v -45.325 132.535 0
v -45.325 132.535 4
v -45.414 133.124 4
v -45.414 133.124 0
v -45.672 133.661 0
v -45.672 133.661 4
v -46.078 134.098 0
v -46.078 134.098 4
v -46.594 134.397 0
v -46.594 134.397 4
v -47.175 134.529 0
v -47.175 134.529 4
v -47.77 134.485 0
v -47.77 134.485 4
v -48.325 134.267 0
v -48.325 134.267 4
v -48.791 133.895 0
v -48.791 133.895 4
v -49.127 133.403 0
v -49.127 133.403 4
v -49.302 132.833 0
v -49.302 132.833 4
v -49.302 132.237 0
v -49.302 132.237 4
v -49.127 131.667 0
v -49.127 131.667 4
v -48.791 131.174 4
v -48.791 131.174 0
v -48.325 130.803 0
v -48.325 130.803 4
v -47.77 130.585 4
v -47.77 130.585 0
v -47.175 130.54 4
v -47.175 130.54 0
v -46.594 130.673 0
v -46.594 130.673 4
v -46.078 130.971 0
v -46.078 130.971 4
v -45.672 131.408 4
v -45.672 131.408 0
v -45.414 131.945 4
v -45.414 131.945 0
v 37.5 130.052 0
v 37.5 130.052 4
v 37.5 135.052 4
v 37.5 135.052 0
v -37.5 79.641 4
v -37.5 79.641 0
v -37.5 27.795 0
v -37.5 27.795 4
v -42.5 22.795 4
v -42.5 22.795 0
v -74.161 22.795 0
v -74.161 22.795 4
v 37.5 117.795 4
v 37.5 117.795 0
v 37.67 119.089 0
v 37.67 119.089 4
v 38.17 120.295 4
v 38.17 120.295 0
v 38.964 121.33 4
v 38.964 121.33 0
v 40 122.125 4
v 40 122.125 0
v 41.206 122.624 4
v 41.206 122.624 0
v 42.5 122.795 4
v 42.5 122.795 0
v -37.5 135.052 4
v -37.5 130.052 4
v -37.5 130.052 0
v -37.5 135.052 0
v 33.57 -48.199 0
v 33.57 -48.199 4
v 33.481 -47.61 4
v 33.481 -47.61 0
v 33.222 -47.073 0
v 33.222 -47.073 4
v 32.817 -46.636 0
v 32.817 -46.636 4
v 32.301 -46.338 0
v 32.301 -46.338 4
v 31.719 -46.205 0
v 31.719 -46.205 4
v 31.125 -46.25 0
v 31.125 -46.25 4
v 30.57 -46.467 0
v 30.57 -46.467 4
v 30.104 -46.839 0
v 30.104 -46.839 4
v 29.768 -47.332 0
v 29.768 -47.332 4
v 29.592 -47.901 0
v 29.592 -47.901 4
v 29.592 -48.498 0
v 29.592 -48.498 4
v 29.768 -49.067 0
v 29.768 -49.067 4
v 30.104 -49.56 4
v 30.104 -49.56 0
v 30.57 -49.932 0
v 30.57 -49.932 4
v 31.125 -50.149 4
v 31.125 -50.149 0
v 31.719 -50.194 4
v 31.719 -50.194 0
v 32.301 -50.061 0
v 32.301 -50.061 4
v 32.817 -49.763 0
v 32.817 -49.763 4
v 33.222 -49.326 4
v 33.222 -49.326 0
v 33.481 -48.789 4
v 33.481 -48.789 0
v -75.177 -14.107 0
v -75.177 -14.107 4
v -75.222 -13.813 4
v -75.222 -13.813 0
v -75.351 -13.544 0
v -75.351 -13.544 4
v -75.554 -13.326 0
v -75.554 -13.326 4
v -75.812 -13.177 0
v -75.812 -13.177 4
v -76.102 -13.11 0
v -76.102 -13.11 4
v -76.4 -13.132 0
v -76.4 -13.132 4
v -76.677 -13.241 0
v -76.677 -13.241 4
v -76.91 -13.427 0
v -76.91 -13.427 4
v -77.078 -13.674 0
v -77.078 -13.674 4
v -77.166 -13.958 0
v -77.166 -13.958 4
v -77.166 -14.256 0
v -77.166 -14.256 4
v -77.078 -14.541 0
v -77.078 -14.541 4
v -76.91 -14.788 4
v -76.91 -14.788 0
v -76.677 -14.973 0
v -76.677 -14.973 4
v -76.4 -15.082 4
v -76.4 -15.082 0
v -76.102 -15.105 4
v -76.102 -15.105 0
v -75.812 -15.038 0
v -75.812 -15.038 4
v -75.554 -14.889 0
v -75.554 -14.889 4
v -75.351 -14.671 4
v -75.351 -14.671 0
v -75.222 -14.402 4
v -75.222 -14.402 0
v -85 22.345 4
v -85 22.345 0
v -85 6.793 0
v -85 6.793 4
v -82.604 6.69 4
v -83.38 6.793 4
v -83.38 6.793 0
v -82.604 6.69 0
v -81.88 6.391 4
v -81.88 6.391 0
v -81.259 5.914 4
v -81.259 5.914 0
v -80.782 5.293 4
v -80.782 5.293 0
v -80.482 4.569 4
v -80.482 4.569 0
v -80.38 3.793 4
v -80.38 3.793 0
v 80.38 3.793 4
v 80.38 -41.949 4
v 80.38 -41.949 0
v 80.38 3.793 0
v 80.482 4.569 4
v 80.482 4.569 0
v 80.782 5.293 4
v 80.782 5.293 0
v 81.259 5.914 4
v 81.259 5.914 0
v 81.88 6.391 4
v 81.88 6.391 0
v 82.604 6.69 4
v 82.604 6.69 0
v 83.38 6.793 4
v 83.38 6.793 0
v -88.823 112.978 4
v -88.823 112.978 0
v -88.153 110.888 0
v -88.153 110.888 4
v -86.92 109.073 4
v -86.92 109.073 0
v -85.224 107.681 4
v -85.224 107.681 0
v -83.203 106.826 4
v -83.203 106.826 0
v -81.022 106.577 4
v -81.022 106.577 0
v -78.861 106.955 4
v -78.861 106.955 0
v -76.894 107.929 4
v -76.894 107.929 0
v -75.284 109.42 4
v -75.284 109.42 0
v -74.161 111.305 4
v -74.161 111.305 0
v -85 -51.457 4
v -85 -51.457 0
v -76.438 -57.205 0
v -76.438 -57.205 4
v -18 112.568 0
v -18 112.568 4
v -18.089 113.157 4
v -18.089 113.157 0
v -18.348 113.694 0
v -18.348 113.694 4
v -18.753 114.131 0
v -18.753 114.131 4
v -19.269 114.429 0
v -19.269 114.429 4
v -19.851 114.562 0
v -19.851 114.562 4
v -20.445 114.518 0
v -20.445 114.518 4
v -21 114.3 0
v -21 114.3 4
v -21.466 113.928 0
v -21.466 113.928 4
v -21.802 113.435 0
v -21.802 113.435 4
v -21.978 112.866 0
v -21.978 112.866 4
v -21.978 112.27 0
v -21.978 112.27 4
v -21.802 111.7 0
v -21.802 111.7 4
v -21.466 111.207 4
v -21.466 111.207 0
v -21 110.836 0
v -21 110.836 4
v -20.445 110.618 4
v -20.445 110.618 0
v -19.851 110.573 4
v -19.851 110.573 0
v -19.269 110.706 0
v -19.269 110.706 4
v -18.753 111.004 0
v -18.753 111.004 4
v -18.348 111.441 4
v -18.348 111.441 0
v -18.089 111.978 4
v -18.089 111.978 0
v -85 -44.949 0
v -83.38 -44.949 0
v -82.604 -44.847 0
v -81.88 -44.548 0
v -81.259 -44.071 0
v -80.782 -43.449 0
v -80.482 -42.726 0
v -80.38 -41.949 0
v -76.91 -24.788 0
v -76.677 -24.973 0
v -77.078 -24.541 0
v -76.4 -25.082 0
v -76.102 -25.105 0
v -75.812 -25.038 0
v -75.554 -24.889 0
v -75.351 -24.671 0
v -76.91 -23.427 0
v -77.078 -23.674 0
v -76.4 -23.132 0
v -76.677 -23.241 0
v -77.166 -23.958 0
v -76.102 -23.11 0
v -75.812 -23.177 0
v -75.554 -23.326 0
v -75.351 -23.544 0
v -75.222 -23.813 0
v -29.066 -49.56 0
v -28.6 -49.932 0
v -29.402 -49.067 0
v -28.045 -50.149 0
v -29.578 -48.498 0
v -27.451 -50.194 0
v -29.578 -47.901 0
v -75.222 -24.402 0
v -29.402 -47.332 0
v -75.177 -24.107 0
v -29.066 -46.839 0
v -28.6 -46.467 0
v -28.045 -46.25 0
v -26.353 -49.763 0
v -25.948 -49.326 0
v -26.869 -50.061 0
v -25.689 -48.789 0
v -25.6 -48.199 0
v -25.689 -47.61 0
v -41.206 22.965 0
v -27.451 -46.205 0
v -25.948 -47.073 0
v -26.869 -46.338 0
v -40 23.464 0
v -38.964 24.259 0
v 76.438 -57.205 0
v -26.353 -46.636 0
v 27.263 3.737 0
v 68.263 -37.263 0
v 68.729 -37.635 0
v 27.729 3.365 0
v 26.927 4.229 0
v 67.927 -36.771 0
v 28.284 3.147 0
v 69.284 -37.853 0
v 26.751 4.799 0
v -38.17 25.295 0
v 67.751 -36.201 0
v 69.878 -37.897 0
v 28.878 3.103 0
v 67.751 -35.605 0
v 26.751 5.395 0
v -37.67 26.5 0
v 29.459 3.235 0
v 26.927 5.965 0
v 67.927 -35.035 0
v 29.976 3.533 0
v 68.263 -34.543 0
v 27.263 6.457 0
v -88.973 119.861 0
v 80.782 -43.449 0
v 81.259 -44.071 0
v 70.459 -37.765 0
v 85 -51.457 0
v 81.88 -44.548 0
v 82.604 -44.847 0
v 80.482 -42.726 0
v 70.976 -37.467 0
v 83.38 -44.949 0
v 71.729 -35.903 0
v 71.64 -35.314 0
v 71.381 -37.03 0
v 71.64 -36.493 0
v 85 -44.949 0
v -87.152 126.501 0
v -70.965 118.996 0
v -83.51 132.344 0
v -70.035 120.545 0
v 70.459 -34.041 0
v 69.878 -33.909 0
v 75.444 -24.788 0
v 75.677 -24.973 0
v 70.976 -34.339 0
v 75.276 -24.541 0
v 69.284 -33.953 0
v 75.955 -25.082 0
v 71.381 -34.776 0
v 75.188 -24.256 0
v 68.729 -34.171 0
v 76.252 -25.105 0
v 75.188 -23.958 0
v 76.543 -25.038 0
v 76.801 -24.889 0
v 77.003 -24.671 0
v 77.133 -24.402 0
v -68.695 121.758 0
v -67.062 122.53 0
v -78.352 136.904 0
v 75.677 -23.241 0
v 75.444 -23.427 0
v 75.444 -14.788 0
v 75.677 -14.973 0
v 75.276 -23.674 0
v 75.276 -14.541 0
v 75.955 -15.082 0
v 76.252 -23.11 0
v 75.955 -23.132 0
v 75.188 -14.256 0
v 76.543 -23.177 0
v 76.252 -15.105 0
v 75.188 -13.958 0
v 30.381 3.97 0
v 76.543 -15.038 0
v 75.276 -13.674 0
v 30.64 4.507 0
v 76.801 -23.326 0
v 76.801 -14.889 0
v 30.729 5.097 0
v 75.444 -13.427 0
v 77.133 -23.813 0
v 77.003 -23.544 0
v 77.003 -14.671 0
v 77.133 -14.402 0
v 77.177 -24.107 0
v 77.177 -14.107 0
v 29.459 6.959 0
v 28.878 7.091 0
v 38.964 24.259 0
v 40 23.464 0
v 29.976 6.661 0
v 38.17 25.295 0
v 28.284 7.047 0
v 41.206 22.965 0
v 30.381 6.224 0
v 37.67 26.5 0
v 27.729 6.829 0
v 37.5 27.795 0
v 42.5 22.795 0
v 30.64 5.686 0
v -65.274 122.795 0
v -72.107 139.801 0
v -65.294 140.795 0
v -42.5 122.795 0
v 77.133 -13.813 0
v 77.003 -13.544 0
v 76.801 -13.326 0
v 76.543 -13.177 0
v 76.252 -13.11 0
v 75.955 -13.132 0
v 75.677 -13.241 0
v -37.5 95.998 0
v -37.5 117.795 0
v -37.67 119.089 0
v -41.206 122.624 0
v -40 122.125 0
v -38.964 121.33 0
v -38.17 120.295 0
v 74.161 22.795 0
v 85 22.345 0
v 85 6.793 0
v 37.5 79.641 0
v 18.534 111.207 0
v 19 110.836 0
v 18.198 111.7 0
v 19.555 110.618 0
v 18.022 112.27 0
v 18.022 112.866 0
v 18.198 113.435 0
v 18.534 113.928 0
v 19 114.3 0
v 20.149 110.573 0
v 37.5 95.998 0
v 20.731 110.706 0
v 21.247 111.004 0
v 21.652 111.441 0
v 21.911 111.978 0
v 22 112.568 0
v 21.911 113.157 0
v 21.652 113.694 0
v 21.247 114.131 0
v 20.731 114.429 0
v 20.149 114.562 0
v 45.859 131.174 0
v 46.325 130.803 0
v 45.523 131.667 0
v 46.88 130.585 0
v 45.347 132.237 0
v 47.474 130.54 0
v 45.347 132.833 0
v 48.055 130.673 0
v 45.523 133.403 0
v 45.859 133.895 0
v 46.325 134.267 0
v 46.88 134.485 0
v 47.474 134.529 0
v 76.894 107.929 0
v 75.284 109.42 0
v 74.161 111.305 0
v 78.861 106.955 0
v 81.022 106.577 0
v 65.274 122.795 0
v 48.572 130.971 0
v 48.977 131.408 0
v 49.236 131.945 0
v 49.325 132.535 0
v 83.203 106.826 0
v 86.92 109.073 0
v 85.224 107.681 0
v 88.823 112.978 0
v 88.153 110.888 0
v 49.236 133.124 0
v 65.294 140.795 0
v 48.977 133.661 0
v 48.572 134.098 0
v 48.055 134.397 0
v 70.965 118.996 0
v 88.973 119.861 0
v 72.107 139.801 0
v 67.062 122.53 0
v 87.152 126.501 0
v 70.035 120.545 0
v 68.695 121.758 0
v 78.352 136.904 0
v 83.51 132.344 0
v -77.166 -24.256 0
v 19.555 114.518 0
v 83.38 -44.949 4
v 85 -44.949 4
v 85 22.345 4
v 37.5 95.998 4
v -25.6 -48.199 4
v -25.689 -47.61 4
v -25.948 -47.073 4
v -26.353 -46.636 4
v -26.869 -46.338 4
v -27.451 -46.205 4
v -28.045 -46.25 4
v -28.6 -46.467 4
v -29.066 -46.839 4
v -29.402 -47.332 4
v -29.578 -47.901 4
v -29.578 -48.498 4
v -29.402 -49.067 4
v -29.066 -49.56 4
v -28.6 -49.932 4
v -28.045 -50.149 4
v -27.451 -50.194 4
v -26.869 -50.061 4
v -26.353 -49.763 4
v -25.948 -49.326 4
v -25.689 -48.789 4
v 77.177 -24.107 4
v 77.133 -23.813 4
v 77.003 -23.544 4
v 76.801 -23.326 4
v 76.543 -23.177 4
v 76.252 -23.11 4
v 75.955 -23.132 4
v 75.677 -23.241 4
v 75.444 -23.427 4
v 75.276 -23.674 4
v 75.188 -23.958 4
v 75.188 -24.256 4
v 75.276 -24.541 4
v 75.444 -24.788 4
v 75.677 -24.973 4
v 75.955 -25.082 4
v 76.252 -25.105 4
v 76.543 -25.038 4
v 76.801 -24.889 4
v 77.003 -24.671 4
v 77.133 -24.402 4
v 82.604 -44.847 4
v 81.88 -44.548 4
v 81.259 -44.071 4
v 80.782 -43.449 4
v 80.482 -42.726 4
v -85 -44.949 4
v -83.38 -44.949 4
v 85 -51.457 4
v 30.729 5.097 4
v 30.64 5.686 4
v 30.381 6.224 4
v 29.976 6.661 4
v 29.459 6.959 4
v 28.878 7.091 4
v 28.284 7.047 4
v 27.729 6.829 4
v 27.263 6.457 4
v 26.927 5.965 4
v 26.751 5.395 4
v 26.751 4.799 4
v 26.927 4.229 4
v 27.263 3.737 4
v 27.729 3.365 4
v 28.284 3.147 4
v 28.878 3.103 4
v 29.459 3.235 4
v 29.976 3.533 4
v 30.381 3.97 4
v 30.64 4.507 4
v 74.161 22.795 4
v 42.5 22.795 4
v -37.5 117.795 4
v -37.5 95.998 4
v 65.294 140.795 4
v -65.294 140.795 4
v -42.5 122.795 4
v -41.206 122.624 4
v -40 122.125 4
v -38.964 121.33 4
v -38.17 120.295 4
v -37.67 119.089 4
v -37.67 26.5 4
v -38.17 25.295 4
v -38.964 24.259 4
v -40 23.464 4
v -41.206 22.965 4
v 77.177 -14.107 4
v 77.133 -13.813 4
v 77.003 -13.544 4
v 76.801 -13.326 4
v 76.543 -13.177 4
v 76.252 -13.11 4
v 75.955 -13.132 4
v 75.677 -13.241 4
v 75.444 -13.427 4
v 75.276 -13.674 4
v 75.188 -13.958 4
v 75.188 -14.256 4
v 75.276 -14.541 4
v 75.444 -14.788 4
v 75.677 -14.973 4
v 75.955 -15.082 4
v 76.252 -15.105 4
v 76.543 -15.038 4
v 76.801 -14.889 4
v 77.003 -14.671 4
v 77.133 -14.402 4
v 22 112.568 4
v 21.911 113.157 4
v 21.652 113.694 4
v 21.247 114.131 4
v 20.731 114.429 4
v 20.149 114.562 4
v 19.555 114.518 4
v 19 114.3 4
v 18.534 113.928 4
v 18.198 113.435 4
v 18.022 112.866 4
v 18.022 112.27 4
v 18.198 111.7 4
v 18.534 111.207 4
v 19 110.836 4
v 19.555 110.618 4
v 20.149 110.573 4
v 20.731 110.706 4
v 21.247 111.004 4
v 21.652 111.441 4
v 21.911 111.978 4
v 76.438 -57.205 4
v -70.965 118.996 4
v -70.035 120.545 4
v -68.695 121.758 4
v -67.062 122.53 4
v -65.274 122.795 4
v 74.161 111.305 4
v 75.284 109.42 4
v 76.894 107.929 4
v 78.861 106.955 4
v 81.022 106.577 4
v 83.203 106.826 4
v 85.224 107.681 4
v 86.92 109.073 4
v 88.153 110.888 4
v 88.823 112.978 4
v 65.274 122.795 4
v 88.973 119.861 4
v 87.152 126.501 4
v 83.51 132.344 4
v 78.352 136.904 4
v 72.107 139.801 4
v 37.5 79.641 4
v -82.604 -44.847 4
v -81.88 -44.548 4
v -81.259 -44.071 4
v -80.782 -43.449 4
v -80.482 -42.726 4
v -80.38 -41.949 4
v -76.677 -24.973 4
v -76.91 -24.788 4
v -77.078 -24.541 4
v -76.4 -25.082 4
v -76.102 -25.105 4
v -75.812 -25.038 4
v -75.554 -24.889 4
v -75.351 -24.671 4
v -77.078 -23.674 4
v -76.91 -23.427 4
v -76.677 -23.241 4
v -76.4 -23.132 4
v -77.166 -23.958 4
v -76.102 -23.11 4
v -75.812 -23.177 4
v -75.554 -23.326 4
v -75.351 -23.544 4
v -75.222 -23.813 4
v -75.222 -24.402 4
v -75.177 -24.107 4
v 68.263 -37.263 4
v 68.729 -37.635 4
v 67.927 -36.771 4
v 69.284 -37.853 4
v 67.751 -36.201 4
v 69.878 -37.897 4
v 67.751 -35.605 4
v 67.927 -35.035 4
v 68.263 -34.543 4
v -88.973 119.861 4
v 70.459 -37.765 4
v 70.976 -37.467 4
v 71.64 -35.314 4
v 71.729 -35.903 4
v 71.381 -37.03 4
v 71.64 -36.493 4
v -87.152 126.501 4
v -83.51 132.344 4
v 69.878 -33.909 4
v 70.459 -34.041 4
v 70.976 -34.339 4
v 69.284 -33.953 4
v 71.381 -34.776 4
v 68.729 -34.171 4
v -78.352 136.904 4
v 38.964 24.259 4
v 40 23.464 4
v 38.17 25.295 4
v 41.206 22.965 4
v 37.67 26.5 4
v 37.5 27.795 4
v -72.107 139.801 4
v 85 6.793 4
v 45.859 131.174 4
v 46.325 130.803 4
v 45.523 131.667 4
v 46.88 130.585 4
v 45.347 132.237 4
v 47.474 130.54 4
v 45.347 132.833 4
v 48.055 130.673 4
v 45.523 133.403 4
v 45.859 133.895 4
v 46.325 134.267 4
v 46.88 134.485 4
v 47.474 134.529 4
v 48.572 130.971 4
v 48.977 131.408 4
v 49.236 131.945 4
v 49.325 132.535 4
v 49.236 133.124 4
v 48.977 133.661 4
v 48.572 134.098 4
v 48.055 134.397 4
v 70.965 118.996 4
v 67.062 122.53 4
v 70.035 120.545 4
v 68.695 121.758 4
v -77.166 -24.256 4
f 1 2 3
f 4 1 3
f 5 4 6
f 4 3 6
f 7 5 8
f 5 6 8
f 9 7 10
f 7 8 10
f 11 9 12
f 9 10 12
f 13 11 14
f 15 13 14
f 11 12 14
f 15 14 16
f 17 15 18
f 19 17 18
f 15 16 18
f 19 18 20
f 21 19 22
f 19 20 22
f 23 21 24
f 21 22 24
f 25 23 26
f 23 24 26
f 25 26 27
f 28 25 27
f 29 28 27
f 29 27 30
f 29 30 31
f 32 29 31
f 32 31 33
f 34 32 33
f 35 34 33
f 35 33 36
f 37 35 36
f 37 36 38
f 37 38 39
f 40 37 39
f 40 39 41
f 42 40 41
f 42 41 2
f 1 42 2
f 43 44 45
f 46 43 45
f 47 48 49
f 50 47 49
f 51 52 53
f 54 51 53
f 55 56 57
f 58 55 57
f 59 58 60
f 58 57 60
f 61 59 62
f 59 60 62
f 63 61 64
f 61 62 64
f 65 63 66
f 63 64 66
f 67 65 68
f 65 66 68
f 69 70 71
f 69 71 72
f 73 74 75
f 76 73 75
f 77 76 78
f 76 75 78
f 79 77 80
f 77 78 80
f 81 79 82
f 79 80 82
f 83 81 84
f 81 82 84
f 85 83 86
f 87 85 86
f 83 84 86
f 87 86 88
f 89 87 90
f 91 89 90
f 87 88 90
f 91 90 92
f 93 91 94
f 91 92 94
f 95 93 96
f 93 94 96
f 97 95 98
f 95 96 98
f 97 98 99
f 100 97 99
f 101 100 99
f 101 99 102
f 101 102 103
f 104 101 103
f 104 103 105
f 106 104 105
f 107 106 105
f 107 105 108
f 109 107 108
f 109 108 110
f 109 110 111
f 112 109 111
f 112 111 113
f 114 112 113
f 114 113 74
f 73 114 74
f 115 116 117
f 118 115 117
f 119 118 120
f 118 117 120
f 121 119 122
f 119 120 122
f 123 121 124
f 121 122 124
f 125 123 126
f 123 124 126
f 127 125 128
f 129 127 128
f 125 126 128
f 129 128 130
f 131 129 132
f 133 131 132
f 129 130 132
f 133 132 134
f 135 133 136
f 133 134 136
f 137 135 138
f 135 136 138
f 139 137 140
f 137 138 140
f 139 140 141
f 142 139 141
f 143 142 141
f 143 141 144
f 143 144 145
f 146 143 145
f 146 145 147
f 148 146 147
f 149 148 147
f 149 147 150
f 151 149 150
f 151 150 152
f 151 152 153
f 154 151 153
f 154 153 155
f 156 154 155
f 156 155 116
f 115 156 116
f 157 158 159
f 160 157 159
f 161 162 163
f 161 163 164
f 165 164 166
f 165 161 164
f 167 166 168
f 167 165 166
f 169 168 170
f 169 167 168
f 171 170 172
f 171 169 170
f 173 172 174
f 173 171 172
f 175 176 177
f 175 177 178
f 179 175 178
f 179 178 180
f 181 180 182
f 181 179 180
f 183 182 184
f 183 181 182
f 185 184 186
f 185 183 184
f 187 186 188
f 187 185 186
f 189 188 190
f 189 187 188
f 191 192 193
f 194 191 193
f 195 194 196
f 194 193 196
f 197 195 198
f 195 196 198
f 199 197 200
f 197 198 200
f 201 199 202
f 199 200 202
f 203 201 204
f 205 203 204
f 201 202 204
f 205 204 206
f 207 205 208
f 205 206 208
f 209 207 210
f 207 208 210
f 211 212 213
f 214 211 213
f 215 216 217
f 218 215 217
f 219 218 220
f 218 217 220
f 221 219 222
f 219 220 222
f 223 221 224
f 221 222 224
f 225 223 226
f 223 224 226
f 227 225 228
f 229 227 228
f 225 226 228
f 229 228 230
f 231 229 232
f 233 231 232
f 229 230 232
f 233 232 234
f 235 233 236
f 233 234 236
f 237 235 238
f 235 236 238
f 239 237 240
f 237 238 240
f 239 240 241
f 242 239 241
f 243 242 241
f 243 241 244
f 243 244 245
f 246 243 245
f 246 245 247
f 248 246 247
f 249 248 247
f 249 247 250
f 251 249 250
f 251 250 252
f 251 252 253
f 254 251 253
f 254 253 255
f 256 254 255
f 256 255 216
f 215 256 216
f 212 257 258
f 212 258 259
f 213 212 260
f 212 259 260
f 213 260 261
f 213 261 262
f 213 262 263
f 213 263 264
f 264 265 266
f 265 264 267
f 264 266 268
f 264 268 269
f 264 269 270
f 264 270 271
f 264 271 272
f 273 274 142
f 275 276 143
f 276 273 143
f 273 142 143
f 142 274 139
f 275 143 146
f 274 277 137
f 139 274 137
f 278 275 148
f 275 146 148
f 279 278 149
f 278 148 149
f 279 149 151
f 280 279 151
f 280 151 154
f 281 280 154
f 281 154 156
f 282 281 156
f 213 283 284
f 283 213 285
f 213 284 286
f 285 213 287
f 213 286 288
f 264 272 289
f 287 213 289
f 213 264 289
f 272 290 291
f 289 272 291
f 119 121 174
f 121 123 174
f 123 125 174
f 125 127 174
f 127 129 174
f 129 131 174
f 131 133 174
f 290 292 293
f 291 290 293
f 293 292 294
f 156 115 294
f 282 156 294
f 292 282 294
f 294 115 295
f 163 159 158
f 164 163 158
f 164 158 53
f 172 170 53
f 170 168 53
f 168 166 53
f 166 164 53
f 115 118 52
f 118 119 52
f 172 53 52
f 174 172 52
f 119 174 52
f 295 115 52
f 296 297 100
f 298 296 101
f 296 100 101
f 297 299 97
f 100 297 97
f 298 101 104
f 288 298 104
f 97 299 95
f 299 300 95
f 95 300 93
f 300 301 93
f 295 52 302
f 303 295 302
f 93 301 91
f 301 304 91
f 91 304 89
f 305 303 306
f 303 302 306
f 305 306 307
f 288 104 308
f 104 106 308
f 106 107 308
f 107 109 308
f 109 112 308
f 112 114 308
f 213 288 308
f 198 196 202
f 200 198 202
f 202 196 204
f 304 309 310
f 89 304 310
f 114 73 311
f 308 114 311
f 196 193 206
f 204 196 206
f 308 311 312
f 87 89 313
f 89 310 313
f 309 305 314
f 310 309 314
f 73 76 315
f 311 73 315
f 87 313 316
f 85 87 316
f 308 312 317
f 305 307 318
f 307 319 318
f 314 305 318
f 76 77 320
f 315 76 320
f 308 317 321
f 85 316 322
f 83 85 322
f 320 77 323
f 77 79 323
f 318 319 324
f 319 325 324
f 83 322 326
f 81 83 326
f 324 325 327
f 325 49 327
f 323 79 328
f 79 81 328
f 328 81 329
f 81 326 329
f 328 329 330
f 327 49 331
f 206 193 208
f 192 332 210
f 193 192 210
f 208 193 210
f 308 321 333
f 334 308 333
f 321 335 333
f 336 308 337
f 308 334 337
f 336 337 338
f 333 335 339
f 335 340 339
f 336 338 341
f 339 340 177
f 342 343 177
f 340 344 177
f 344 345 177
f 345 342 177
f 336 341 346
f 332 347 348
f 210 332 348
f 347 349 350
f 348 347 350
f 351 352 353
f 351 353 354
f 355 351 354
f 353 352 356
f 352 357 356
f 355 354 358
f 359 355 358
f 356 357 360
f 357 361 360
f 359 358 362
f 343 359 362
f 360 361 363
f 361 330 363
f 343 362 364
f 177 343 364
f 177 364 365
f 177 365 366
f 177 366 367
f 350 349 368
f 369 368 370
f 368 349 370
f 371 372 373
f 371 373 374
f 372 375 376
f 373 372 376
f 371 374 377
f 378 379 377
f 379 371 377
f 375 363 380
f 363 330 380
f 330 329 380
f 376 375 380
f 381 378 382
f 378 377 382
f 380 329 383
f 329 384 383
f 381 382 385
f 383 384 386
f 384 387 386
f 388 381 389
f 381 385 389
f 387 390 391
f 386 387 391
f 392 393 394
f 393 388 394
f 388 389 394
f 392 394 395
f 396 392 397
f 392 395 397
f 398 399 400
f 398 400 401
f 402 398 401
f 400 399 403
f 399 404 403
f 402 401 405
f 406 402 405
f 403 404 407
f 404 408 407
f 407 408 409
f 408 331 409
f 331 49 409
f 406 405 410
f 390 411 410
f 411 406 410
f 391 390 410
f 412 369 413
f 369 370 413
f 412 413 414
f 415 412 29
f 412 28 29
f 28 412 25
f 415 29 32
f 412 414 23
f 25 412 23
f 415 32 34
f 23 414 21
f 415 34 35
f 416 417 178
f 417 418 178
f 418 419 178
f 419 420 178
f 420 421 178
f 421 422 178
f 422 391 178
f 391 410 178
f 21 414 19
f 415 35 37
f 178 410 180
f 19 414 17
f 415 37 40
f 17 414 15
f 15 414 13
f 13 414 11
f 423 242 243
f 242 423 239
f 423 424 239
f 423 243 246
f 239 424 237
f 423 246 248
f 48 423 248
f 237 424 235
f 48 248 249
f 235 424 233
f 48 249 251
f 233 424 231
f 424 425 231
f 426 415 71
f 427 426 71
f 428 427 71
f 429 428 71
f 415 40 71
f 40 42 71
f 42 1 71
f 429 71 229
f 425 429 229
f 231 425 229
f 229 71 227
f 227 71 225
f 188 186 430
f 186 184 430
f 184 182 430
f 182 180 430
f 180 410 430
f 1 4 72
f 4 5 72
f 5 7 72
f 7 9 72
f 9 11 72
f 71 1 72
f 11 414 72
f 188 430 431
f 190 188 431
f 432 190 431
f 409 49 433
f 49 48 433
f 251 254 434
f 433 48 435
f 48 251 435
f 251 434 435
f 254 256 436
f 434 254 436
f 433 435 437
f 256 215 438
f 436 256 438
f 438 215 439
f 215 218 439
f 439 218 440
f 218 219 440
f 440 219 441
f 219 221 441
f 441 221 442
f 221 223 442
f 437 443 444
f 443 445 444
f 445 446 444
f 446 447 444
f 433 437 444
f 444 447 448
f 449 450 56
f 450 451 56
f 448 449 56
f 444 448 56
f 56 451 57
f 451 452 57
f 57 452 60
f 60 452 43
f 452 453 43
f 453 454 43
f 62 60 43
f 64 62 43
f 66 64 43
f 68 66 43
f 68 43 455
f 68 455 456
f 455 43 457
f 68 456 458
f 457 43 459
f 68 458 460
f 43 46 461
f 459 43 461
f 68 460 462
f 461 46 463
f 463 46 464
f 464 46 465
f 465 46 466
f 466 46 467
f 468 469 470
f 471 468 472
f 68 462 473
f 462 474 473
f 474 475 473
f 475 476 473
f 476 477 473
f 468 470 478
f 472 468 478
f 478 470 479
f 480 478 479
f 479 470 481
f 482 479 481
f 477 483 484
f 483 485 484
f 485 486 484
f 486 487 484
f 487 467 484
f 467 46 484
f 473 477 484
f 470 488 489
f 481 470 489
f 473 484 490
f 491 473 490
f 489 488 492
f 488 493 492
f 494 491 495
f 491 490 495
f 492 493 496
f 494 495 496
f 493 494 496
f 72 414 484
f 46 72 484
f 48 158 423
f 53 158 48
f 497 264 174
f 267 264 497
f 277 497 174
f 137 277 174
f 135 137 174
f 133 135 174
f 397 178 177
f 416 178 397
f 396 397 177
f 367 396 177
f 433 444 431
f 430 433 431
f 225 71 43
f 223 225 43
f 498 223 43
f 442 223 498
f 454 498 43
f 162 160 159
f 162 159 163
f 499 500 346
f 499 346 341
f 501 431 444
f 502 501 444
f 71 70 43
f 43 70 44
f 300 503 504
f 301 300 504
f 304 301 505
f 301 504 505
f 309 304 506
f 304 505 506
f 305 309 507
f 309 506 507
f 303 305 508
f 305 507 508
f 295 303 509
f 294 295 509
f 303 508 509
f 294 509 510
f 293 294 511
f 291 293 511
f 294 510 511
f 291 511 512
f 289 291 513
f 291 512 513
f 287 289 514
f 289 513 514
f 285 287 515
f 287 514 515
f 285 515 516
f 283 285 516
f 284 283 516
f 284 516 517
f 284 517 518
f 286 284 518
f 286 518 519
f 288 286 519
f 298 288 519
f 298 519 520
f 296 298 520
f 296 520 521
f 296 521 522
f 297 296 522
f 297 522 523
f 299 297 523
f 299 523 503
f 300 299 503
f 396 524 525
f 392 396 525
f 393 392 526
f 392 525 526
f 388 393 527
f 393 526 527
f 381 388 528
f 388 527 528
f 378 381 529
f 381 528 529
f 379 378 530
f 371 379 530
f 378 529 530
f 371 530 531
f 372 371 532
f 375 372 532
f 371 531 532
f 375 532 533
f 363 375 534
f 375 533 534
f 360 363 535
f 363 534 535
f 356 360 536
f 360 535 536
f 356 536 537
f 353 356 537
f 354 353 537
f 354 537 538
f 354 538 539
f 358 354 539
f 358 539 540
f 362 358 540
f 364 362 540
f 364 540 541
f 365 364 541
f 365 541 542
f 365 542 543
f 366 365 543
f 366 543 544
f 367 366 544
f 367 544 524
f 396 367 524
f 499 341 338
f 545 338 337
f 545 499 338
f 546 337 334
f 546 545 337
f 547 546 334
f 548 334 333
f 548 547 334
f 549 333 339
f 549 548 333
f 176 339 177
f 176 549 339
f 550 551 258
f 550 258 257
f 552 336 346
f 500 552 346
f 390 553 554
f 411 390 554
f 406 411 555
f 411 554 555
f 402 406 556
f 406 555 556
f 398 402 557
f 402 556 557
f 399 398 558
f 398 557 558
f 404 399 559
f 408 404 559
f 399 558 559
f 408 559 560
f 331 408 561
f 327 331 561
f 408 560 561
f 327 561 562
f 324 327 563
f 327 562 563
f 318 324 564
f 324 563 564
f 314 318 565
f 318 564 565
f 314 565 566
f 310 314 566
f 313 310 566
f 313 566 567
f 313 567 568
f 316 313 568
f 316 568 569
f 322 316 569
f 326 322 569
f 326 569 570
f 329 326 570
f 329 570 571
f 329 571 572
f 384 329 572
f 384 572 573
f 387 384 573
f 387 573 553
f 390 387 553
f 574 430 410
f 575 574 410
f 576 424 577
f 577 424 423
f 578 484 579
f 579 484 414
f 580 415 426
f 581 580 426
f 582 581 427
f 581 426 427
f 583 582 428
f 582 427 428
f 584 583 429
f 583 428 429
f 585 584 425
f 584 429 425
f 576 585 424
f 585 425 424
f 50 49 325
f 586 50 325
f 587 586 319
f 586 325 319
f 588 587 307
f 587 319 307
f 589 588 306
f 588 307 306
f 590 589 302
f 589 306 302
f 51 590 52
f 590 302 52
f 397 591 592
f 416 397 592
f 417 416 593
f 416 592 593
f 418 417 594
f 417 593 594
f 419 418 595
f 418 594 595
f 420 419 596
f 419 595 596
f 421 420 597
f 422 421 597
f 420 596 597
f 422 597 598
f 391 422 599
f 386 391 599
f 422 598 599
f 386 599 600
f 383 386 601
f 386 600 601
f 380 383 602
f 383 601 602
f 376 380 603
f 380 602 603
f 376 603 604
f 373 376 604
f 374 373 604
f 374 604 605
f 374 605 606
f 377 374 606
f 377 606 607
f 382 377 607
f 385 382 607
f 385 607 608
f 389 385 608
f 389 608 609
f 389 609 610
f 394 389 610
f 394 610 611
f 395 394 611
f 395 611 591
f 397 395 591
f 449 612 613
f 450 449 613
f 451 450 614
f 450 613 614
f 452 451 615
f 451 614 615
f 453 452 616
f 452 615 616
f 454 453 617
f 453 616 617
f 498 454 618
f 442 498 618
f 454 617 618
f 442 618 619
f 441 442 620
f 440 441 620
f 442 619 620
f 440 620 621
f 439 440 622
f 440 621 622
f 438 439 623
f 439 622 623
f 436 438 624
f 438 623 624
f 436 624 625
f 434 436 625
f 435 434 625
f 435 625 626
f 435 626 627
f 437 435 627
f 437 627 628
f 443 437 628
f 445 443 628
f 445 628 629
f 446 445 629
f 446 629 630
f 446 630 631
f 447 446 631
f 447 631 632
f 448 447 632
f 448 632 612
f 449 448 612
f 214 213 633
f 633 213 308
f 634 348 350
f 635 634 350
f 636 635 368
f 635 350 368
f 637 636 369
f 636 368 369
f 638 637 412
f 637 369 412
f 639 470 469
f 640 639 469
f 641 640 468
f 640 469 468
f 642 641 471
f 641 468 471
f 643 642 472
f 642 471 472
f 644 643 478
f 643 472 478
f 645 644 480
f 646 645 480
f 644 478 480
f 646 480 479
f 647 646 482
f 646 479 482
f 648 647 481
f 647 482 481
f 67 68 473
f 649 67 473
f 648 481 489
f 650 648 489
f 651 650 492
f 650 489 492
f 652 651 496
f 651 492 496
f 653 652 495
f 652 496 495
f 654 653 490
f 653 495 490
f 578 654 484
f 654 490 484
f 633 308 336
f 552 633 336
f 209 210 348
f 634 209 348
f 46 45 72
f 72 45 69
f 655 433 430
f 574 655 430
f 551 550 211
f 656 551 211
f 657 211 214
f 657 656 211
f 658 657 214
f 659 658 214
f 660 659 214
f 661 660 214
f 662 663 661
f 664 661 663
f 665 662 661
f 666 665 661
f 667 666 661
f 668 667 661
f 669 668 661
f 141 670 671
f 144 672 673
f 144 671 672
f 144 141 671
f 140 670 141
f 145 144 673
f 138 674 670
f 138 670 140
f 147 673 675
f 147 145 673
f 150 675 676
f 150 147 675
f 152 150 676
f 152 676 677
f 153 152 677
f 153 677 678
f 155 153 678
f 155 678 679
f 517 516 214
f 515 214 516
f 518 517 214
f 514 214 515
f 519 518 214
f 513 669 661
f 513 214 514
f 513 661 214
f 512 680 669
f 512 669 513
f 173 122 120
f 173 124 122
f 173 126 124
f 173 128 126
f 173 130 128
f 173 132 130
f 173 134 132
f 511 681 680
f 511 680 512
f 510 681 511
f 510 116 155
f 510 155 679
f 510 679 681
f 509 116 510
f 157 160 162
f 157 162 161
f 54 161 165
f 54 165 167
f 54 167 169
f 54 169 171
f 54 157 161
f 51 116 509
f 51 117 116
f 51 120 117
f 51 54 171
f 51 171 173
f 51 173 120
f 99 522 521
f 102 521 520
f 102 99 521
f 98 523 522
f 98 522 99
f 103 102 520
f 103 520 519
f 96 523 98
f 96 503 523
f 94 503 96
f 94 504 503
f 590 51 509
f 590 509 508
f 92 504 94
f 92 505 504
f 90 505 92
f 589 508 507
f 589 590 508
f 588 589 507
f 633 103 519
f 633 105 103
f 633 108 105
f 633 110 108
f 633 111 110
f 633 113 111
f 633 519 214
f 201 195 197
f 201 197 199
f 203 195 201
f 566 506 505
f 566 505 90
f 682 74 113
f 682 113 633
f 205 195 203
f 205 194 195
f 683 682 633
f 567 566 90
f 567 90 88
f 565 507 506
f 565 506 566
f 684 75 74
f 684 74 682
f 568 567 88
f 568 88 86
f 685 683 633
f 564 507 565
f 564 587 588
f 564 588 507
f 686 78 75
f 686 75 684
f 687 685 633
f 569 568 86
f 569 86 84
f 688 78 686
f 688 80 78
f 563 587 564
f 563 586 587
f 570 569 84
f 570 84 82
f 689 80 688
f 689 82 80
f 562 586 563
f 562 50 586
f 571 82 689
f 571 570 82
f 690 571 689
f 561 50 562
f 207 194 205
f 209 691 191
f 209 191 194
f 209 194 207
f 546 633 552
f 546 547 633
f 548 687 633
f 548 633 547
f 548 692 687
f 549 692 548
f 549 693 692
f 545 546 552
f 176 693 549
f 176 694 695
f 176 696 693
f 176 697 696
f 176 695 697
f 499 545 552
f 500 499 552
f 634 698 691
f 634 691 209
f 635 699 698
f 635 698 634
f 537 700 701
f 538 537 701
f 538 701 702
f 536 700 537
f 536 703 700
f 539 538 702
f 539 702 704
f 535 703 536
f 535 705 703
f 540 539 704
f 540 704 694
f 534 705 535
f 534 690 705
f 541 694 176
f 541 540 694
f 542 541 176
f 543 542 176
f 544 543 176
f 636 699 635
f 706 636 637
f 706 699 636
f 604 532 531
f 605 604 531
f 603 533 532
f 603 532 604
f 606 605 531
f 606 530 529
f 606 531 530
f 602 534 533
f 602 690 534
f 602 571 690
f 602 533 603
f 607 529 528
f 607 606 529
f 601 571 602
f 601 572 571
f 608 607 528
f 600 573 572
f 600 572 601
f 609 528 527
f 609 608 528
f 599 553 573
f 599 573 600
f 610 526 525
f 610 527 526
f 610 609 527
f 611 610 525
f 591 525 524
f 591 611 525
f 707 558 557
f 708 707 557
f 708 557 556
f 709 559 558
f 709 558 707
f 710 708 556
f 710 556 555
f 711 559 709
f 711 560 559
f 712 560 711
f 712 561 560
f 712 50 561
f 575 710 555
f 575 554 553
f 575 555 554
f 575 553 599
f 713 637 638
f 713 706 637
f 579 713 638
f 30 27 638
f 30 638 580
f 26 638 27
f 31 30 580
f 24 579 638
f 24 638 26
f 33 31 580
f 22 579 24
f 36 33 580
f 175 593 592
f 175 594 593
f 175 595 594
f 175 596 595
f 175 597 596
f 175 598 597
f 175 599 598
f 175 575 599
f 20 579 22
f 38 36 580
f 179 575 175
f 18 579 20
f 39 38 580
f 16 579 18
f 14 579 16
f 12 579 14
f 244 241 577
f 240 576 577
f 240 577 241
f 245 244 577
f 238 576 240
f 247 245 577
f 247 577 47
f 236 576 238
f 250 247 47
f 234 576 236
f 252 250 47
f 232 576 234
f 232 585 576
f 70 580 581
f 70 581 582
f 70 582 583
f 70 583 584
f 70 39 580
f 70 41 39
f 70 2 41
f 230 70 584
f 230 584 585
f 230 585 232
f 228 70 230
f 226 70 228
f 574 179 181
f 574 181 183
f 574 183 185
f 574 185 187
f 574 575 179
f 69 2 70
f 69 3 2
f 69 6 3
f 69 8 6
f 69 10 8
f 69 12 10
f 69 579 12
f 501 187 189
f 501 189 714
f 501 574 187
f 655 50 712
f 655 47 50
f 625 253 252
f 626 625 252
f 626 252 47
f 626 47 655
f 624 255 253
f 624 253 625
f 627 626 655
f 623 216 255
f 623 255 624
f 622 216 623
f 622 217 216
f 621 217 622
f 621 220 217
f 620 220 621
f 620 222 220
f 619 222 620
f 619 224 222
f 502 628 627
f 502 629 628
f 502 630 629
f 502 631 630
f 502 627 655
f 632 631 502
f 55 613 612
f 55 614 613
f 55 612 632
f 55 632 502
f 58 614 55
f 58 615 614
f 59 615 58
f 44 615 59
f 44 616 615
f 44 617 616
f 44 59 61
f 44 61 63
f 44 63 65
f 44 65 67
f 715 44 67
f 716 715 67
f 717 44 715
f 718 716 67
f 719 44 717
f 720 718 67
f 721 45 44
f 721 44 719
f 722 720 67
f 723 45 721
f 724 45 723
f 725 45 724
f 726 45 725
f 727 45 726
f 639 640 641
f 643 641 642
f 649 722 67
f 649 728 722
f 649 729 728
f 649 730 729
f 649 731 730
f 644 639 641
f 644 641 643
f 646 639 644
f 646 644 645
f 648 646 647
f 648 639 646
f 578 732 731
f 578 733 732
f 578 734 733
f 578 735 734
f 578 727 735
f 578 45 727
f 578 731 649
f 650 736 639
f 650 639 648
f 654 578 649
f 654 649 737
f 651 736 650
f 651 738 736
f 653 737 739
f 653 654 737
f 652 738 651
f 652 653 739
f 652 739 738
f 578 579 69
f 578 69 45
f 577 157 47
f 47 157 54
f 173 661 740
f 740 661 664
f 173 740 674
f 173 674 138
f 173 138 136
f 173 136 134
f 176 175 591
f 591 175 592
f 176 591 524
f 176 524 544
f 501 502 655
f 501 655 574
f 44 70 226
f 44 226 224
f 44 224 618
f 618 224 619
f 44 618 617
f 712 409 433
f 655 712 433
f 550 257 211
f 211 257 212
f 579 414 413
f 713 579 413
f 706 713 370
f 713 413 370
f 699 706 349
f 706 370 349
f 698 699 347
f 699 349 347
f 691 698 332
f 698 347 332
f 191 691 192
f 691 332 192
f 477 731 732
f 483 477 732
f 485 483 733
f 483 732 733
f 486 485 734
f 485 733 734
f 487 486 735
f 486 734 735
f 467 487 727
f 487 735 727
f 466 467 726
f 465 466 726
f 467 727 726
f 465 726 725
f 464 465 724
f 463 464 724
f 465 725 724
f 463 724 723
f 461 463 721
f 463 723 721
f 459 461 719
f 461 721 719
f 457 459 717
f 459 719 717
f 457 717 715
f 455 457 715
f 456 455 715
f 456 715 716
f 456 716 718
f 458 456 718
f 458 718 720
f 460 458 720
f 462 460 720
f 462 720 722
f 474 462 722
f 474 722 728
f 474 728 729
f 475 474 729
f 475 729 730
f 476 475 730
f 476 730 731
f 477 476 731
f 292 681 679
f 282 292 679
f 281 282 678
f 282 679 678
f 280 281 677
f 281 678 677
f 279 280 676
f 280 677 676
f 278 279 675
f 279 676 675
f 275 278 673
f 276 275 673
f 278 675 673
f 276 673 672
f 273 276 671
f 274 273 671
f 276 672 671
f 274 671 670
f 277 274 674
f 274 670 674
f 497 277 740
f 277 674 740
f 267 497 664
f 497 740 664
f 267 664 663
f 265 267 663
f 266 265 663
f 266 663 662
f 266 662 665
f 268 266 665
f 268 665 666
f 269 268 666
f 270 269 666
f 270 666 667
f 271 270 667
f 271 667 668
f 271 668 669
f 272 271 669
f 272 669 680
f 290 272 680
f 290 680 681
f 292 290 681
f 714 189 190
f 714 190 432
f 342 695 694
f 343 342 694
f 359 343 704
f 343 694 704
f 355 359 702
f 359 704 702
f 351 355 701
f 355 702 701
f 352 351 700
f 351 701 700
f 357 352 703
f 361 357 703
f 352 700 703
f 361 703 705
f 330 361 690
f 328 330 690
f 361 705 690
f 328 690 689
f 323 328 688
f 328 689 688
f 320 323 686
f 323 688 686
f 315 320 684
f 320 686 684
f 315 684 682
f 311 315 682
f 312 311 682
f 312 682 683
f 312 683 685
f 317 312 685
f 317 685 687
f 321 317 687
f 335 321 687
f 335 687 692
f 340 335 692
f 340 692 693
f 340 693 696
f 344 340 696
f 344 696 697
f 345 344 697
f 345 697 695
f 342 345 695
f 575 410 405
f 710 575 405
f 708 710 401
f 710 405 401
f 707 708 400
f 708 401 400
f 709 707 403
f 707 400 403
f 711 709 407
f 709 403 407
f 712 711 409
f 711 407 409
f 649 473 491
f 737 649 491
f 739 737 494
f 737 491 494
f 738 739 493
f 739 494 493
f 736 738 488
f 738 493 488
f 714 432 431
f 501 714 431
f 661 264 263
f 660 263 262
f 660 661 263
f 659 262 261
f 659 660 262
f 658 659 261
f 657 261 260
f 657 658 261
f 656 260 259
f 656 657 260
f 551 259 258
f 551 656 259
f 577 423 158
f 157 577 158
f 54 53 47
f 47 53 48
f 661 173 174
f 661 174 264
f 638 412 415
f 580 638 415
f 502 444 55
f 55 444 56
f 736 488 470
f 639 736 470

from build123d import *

# Parameters (mm, degrees)
BOSS_EXTRUDE1_DEPTH = 4
SKETCH3_R           = 2
CUT_EXTRUDE1_DEPTH  = 10
CUT_EXTRUDE2_DEPTH  = 10
SKETCH5_W           = 37.5
SKETCH5_H           = 5
SKETCH5_R           = 2
CUT_EXTRUDE3_DEPTH  = 10
SKETCH6_R           = 2
CUT_EXTRUDE4_DEPTH  = 10
SKETCH7_R           = 1
CUT_EXTRUDE5_DEPTH  = 10
SKETCH8_R           = 2
CUT_EXTRUDE6_DEPTH  = 10


with BuildPart() as part:
    # Sketch1 → Boss-Extrude1 (new body)
    # profile 1 of 2: a face of its own
    with BuildSketch(Plane.XY):
        with BuildLine():
            Line((0, -57.20543624), (0, 140.79456376))
            Line((0, 140.79456376), (-50, 140.79456376))
            Line((-50, 140.79456376), (-65.293896859, 140.79456376))
            ThreePointArc((-65.293896859, 140.79456376), (-83.510437362, 132.343917874), (-88.822955159, 112.978151212))
            ThreePointArc((-88.822955159, 112.978151212), (-82.121571276, 106.62300147), (-74.161000128, 111.305498795))
            Line((-74.161000128, 111.305498795), (-70.965431907, 118.996456291))
            ThreePointArc((-70.965431907, 118.996456291), (-68.695430494, 121.757834263), (-65.274420897, 122.79456376))
            Line((-65.274420897, 122.79456376), (-50.707299907, 122.79456376))
            Line((-50.707299907, 122.79456376), (-42.5, 122.79456376))
            ThreePointArc((-42.5, 122.79456376), (-38.964466094, 121.330097666), (-37.5, 117.79456376))
            Line((-37.5, 117.79456376), (-37.5, 95.998067584))
            Line((-37.5, 95.998067584), (-85, 22.344598664))
            Line((-85, 22.344598664), (-85, -51.456618505))
            Line((-85, -51.456618505), (-76.438195827, -57.20543624))
            Line((-76.438195827, -57.20543624), (0, -57.20543624))
        make_face()
        with BuildLine():
            ThreePointArc((-37.5, 27.79456376), (-38.964466094, 24.259029854), (-42.5, 22.79456376))
            Line((-42.5, 22.79456376), (-74.161000128, 22.79456376))
            Line((-74.161000128, 22.79456376), (-37.5, 79.641086571))
            Line((-37.5, 79.641086571), (-37.5, 27.79456376))
        make_face(mode=Mode.SUBTRACT)
    # profile 2 of 2: a face of its own
    with BuildSketch(Plane.XY):
        with BuildLine():
            Line((65.293896859, 140.79456376), (50, 140.79456376))
            Line((50, 140.79456376), (0, 140.79456376))
            Line((0, 140.79456376), (0, -57.20543624))
            Line((0, -57.20543624), (76.438195827, -57.20543624))
            Line((76.438195827, -57.20543624), (85, -51.456618505))
            Line((85, -51.456618505), (85, 22.344598664))
            Line((85, 22.344598664), (37.5, 95.998067584))
            Line((37.5, 95.998067584), (37.5, 117.79456376))
            ThreePointArc((37.5, 117.79456376), (38.964466094, 121.330097666), (42.5, 122.79456376))
            Line((42.5, 122.79456376), (50.707299907, 122.79456376))
            Line((50.707299907, 122.79456376), (65.274420897, 122.79456376))
            ThreePointArc((65.274420897, 122.79456376), (68.695430494, 121.757834263), (70.965431907, 118.996456291))
            Line((70.965431907, 118.996456291), (74.161000128, 111.305498795))
            ThreePointArc((74.161000128, 111.305498795), (82.121571276, 106.62300147), (88.822955159, 112.978151212))
            ThreePointArc((88.822955159, 112.978151212), (83.510437362, 132.343917874), (65.293896859, 140.79456376))
        make_face()
        with BuildLine():
            Line((37.5, 79.641086571), (74.161000128, 22.79456376))
            Line((74.161000128, 22.79456376), (42.5, 22.79456376))
            ThreePointArc((42.5, 22.79456376), (38.964466094, 24.259029854), (37.5, 27.79456376))
            Line((37.5, 27.79456376), (37.5, 79.641086571))
        make_face(mode=Mode.SUBTRACT)
    extrude(amount=BOSS_EXTRUDE1_DEPTH)

    # Sketch3 → Cut-Extrude1 (cut)
    with BuildSketch(Plane.XY.offset(4)):
        with Locations((-47.324700565, 132.53476761)):
            Circle(SKETCH3_R)
        with Locations((47.324700565, 132.53476761)):
            Circle(SKETCH3_R)
    extrude(amount=-CUT_EXTRUDE1_DEPTH, mode=Mode.SUBTRACT)

    # Sketch4 → Cut-Extrude2 (cut)
    with BuildSketch(Plane.XY.offset(4)):
        with BuildLine():
            Line((-99.472025614, 6.792585345), (-83.380037388, 6.792585345))
            ThreePointArc((-83.380037388, 6.792585345), (-81.258717044, 5.913905689), (-80.380037388, 3.792585345))
            Line((-80.380037388, 3.792585345), (-80.380037388, -41.949469703))
            ThreePointArc((-80.380037388, -41.949469703), (-81.258717044, -44.070790047), (-83.380037388, -44.949469703))
            Line((-83.380037388, -44.949469703), (-99.472025614, -44.949469703))
            Line((-99.472025614, -44.949469703), (-99.472025614, 6.792585345))
        make_face()
        with BuildLine():
            Line((99.472025614, -44.949469703), (83.380037388, -44.949469703))
            ThreePointArc((83.380037388, -44.949469703), (81.258717044, -44.070790047), (80.380037388, -41.949469703))
            Line((80.380037388, -41.949469703), (80.380037388, 3.792585345))
            ThreePointArc((80.380037388, 3.792585345), (81.258717044, 5.913905689), (83.380037388, 6.792585345))
            Line((83.380037388, 6.792585345), (99.472025614, 6.792585345))
            Line((99.472025614, 6.792585345), (99.472025614, -44.949469703))
        make_face()
    extrude(amount=-CUT_EXTRUDE2_DEPTH, mode=Mode.SUBTRACT)

    # Sketch5 → Cut-Extrude3 (cut)
    with BuildSketch(Plane.XY.offset(4)):
        with Locations((-18.75, 132.551936771)):
            Rectangle(SKETCH5_W, SKETCH5_H)
        with Locations((18.75, 132.551936771)):
            Rectangle(SKETCH5_W, SKETCH5_H)
        with Locations((20, 112.567697597)):
            Circle(SKETCH5_R)
        with Locations((-20, 112.567697597)):
            Circle(SKETCH5_R)
    extrude(amount=-CUT_EXTRUDE3_DEPTH, mode=Mode.SUBTRACT)

    # Sketch6 → Cut-Extrude4 (cut)
    with BuildSketch(Plane.XY.offset(4)):
        with Locations((28.728783517, 5.096950375)):
            Circle(SKETCH6_R)
        with Locations((69.728783517, -35.903049625)):
            Circle(SKETCH6_R)
    extrude(amount=-CUT_EXTRUDE4_DEPTH, mode=Mode.SUBTRACT)

    # Sketch7 → Cut-Extrude5 (cut)
    with BuildSketch(Plane.XY.offset(4)):
        with Locations((-76.177192192, -14.107414655)):
            Circle(SKETCH7_R)
        with Locations((-76.177192192, -24.107414655)):
            Circle(SKETCH7_R)
        with Locations((76.177192192, -24.107414655)):
            Circle(SKETCH7_R)
        with Locations((76.177192192, -14.107414655)):
            Circle(SKETCH7_R)
    extrude(amount=-CUT_EXTRUDE5_DEPTH, mode=Mode.SUBTRACT)

    # Sketch8 → Cut-Extrude6 (cut)
    with BuildSketch(Plane.XY.offset(4)):
        with Locations((-27.6, -48.199469703)):
            Circle(SKETCH8_R)
        with Locations((31.57, -48.199469703)):
            Circle(SKETCH8_R)
    extrude(amount=-CUT_EXTRUDE6_DEPTH, mode=Mode.SUBTRACT)


solid = part.part
